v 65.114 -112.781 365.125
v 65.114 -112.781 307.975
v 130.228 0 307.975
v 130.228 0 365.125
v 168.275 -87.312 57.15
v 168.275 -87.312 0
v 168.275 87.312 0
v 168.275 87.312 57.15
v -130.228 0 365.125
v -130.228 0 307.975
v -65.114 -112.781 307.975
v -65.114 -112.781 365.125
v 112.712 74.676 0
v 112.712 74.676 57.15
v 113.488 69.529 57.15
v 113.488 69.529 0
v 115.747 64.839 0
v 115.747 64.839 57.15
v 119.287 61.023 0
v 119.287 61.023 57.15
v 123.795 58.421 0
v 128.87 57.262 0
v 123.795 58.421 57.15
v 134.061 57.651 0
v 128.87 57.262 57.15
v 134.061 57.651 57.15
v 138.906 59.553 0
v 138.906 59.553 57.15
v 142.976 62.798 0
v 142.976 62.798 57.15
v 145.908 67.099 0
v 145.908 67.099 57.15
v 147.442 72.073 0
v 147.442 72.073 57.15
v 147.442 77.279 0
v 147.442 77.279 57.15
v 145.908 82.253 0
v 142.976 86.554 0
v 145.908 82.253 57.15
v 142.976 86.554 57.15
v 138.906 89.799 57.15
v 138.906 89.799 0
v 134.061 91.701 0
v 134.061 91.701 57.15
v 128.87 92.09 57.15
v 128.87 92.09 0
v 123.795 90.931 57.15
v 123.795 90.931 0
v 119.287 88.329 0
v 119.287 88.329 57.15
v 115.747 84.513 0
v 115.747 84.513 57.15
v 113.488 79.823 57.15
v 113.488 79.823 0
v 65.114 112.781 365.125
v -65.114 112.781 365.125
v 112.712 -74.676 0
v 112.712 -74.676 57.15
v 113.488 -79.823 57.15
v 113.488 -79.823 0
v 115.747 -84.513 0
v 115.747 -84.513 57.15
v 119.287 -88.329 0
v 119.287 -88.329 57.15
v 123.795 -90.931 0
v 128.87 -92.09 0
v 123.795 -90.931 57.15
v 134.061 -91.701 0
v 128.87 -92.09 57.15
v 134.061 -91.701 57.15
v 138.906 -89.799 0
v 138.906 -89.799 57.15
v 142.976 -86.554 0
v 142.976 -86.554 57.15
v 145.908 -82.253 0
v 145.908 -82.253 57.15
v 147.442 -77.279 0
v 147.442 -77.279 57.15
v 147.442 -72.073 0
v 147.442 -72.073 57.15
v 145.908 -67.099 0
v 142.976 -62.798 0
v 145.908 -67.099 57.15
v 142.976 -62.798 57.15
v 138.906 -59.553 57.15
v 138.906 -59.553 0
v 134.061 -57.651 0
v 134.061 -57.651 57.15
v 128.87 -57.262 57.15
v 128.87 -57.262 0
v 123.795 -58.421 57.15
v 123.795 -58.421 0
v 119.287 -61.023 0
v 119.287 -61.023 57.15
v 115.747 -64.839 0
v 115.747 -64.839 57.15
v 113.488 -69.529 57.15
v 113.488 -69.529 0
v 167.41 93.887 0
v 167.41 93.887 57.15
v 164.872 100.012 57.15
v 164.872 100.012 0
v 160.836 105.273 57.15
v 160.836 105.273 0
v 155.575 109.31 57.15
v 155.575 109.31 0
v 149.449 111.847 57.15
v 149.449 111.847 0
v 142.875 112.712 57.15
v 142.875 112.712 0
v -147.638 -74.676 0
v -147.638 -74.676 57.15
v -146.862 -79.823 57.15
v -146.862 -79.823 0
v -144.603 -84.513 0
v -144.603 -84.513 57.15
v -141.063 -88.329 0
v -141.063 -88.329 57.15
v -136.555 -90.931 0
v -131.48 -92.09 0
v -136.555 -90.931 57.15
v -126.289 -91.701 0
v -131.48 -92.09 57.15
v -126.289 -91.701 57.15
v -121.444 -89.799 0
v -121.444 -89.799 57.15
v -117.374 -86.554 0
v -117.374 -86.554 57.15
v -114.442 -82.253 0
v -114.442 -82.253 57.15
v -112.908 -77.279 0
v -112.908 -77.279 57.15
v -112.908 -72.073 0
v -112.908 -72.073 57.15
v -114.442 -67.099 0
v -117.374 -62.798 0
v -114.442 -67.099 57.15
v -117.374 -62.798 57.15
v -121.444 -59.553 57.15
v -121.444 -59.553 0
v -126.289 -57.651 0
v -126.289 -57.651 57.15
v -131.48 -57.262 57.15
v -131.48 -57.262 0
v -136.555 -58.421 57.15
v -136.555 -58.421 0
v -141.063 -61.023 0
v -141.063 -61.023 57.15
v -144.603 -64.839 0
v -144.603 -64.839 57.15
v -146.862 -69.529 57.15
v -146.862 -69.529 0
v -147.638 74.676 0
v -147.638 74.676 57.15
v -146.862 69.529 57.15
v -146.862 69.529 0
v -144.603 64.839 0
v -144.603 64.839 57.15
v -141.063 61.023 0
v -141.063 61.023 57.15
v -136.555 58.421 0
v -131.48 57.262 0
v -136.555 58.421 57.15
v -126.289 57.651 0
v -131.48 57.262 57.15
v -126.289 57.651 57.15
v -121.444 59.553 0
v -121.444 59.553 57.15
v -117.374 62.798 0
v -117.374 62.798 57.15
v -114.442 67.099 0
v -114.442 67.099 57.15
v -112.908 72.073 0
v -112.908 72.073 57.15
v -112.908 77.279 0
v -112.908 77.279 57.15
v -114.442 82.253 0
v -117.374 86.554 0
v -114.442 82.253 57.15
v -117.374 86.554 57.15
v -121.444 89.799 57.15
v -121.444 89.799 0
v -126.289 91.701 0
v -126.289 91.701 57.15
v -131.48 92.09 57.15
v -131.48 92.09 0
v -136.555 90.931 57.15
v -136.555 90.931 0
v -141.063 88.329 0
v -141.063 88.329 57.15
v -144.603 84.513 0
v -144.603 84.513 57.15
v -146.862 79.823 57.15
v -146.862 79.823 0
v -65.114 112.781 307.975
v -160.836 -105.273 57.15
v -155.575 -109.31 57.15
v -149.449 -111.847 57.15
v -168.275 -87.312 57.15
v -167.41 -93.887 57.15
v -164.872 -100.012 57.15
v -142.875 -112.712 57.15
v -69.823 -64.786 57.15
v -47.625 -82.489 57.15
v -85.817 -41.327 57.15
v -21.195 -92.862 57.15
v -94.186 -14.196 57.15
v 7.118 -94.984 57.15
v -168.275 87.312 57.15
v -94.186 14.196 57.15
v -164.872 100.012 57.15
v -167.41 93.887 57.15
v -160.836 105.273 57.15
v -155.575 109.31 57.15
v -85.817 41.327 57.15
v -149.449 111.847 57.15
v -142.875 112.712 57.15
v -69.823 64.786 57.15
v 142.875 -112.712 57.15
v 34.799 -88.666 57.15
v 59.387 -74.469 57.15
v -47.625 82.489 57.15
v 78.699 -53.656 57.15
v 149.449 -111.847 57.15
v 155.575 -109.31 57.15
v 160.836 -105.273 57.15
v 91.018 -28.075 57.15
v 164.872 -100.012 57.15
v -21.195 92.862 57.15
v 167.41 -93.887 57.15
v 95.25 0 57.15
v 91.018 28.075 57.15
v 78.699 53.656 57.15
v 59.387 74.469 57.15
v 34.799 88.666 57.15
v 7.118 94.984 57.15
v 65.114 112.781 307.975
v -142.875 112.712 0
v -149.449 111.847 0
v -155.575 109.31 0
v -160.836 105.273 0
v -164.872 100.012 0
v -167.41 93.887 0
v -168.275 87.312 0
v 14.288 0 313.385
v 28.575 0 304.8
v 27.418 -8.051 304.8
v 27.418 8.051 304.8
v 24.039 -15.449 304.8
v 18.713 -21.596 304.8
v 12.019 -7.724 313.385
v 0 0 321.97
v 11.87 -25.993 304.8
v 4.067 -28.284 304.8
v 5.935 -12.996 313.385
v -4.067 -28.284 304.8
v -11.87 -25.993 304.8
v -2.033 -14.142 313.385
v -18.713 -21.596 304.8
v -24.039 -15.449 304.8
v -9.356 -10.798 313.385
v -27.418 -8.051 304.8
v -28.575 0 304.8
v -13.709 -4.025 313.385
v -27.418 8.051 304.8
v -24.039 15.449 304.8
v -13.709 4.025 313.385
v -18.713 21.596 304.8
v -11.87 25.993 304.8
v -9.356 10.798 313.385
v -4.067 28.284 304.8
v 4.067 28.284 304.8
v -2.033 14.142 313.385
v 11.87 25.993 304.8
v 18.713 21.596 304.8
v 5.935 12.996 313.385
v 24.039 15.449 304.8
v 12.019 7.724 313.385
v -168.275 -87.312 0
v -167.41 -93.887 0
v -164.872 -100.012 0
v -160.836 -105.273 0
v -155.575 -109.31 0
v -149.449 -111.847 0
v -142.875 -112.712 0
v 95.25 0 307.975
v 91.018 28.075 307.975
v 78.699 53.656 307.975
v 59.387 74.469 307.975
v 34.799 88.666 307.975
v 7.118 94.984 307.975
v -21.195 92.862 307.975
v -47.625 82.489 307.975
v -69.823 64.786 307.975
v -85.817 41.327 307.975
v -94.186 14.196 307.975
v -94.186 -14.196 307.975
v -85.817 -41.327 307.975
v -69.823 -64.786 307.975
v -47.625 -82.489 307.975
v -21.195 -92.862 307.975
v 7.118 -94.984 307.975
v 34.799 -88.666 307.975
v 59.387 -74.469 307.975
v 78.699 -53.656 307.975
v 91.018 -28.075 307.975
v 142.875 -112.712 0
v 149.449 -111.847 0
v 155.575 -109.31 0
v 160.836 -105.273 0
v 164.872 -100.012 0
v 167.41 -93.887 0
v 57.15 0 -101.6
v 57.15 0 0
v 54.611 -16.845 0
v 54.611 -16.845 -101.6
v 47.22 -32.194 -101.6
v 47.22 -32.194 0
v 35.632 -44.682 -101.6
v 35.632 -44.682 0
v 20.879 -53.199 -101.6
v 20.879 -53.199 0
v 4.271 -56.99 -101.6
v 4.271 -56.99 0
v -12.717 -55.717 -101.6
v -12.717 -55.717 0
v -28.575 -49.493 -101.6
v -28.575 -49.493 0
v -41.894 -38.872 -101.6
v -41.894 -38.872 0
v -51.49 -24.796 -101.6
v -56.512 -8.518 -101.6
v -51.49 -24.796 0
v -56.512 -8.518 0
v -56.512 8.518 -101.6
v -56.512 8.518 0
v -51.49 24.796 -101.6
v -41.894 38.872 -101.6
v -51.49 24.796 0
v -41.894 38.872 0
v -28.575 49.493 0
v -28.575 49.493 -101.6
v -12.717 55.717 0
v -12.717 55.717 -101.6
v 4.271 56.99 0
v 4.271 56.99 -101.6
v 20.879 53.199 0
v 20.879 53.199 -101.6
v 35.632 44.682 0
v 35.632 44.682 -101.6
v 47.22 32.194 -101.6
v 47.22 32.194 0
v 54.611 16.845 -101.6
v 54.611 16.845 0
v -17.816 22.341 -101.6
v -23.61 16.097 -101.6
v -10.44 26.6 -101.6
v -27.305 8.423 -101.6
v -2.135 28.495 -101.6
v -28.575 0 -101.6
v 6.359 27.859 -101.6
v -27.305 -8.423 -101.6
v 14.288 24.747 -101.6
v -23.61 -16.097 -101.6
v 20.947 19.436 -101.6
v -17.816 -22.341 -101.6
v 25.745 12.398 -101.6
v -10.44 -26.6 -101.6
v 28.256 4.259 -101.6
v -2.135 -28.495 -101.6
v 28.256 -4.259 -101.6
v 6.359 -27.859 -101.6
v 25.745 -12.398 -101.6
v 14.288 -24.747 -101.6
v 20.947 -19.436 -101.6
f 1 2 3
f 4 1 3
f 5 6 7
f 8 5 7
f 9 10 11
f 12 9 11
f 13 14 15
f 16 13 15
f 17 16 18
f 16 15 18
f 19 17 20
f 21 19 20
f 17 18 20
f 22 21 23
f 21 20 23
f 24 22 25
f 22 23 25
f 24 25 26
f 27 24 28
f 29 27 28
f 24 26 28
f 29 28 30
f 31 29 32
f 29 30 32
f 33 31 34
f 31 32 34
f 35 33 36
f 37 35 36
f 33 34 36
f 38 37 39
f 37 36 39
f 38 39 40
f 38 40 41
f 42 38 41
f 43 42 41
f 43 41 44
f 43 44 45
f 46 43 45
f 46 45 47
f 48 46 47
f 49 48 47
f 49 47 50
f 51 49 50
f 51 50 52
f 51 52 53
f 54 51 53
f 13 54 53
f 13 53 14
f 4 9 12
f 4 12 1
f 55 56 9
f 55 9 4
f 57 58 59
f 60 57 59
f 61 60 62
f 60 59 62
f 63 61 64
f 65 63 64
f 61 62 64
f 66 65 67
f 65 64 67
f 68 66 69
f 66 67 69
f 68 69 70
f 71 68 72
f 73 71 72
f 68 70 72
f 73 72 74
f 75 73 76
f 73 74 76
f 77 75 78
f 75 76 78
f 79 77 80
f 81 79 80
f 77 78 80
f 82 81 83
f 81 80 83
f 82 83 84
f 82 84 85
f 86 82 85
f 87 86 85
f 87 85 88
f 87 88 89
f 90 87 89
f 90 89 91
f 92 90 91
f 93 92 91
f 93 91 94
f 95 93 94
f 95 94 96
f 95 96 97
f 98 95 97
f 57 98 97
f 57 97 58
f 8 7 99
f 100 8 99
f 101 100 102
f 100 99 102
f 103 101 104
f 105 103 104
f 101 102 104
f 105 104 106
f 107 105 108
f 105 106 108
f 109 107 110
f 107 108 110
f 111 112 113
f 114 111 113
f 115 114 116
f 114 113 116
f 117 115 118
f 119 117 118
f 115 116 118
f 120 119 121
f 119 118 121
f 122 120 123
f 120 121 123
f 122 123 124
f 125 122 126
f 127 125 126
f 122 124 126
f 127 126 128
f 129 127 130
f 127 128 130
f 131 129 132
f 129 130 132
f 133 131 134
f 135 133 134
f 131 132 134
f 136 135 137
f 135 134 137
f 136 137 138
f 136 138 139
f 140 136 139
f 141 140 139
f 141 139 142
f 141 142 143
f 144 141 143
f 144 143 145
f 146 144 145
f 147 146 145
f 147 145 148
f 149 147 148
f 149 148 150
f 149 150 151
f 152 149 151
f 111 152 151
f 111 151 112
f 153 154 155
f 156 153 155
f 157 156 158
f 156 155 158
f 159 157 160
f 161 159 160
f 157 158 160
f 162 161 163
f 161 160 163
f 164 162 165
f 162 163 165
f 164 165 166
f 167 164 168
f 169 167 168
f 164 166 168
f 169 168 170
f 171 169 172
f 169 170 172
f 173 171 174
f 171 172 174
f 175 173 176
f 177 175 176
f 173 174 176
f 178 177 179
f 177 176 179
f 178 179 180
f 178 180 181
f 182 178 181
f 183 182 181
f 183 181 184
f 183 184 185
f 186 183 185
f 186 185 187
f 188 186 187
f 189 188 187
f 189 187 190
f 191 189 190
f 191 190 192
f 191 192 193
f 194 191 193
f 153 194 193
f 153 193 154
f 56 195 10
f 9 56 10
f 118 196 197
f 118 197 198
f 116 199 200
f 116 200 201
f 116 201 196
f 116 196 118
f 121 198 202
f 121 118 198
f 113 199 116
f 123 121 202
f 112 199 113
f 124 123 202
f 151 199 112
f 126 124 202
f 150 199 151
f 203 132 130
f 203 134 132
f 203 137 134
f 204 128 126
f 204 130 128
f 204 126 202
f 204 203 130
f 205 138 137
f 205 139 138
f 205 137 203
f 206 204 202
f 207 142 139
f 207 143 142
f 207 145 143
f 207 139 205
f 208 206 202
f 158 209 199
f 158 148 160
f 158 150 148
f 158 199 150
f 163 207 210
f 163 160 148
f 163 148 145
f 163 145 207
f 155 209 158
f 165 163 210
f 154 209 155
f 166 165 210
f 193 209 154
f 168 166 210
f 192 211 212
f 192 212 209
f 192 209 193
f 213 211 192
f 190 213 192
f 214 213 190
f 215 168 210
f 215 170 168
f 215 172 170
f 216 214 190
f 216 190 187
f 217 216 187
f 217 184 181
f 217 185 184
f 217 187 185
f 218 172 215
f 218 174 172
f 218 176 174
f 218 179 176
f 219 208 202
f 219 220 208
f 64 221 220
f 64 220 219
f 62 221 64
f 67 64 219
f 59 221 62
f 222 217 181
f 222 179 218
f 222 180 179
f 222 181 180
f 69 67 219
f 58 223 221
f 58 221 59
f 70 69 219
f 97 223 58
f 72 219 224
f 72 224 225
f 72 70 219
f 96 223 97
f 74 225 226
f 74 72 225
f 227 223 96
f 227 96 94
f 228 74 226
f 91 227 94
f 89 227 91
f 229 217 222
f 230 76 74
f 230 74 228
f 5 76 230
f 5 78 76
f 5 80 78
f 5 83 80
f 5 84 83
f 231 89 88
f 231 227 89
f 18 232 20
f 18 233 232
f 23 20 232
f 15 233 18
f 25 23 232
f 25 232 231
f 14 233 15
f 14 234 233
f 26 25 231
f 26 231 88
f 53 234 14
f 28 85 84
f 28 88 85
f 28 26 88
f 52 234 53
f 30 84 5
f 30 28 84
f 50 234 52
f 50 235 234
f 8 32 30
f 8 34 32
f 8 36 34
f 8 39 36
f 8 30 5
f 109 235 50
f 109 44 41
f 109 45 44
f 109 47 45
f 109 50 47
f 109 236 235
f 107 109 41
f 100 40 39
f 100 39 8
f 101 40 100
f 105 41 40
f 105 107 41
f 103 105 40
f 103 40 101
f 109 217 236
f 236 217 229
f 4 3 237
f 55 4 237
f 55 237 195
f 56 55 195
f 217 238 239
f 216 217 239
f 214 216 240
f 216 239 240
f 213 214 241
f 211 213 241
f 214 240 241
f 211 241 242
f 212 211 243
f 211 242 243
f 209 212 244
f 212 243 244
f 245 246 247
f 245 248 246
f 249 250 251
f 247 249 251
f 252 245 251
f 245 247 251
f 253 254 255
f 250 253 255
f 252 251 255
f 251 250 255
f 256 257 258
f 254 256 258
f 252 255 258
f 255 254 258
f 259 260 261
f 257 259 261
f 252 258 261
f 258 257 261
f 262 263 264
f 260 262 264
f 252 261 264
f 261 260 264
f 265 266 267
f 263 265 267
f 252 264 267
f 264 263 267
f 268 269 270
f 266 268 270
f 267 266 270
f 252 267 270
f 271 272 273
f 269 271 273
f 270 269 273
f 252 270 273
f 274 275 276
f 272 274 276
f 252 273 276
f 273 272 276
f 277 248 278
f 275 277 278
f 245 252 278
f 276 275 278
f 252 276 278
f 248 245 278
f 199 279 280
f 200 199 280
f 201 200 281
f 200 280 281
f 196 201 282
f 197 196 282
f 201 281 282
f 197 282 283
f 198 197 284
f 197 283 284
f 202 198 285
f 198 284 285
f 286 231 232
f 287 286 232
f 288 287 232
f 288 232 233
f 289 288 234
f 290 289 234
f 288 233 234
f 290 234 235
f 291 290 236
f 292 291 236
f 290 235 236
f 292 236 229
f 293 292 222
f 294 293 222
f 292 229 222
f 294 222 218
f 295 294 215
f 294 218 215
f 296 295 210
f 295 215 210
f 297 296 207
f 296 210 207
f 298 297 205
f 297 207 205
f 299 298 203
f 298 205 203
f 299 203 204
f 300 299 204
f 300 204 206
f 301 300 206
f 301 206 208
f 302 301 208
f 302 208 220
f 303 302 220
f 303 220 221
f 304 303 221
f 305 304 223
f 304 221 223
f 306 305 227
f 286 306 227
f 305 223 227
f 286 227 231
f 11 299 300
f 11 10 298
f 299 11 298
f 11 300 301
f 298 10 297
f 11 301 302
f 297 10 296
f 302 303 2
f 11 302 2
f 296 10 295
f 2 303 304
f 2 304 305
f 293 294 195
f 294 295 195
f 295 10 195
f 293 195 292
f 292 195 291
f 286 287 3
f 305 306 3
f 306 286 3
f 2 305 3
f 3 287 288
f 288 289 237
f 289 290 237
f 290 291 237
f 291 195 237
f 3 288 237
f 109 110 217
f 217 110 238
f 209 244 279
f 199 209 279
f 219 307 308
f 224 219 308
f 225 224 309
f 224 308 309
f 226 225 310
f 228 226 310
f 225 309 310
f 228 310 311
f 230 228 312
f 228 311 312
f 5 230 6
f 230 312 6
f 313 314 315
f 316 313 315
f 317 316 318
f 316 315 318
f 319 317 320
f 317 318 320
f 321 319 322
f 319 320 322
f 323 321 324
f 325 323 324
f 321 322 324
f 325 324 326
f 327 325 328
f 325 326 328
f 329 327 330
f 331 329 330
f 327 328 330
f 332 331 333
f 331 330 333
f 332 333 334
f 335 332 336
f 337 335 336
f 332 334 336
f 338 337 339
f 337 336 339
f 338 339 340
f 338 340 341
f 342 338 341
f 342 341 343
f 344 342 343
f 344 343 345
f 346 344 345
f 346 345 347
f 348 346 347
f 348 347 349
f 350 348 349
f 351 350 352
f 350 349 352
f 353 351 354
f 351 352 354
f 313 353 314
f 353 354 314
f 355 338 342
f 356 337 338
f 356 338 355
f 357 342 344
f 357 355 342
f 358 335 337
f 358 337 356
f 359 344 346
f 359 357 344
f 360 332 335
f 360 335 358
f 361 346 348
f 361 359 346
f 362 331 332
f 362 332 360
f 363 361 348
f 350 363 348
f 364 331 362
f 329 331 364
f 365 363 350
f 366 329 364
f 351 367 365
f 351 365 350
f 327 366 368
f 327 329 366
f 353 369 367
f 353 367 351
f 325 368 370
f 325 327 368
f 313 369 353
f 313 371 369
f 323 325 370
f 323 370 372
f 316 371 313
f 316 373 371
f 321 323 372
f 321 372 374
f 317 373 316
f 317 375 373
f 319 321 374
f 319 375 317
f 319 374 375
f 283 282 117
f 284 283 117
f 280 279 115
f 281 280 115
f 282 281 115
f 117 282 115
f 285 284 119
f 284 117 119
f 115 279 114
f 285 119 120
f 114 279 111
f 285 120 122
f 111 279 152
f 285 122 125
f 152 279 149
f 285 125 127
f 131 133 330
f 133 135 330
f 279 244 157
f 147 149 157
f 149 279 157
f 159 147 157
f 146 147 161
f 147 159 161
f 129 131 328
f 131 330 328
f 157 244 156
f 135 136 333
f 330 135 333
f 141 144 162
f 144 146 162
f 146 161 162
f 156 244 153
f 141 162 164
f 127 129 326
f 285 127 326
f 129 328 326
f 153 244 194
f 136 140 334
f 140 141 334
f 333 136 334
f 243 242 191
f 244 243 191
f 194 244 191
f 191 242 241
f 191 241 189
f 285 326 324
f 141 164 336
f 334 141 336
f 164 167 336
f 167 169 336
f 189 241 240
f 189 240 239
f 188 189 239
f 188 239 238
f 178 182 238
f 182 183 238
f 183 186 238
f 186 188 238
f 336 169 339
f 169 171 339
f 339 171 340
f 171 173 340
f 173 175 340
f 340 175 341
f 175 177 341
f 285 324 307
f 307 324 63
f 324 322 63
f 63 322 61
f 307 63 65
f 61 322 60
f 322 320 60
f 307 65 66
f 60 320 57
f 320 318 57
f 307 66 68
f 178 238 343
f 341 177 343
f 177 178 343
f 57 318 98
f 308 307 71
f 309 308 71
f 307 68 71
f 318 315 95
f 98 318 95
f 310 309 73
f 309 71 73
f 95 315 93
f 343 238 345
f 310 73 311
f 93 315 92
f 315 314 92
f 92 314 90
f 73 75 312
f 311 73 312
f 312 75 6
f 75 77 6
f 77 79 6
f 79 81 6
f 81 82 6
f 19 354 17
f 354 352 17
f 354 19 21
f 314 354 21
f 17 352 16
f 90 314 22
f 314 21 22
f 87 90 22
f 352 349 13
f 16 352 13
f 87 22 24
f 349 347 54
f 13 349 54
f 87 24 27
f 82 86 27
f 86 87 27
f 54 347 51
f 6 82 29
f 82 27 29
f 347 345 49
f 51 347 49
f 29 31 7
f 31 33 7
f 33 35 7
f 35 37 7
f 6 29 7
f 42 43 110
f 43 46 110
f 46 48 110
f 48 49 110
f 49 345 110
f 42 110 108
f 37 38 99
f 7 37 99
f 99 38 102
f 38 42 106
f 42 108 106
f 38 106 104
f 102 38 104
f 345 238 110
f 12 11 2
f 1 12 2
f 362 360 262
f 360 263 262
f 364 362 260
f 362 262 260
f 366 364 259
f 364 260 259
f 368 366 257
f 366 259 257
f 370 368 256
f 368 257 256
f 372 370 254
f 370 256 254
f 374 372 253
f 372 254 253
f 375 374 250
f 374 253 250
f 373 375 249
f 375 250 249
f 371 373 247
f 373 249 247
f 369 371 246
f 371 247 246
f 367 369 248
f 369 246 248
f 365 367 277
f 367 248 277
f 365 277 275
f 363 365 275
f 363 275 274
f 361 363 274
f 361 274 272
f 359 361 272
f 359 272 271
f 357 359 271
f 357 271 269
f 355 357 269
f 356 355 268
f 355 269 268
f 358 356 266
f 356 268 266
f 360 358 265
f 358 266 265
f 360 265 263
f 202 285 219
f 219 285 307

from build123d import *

# Parameters (mm, degrees)
F1_DEPTH  = 57.15
F2_R      = 95.25
F3_DEPTH  = 250.825
F5_DEPTH  = 57.15
F7_D      = 34.925
F8_R      = 57.15
F9_DEPTH  = 101.6
F11_D     = 57.15
F11_DEPTH = 406.4
F11_TIP   = 17.1695921887


with BuildPart() as f1:
    # F0 (on Top) → F1 (new body)
    with BuildSketch(Plane.XY):
        with BuildLine():
            Line((142.875, 112.7125), (-142.875, 112.7125))
            ThreePointArc((-142.875, 112.7125), (-160.8355122421, 105.2730122421), (-168.275, 87.3125))
            Line((-168.275, 87.3125), (-168.275, -87.3125))
            ThreePointArc((-168.275, -87.3125), (-160.8355122421, -105.2730122421), (-142.875, -112.7125))
            Line((-142.875, -112.7125), (142.875, -112.7125))
            ThreePointArc((142.875, -112.7125), (160.8355122421, -105.2730122421), (168.275, -87.3125))
            Line((168.275, -87.3125), (168.275, 87.3125))
            ThreePointArc((168.275, 87.3125), (160.8355122421, 105.2730122421), (142.875, 112.7125))
        make_face()
    extrude(amount=F1_DEPTH)

    # F2 (on face) → F3 (join)
    with BuildSketch(Plane.XY.offset(57.15)):
        Circle(F2_R)
    extrude(amount=F3_DEPTH)

    # F4 (on face) → F5 (join)
    with BuildSketch(Plane.XY.offset(307.975)):
        Polygon((65.11400916, 112.7807721496), (-65.11400916, 112.7807721496), (-130.2280183199, 0), (-65.11400916, -112.7807721496), (65.11400916, -112.7807721496), (130.2280183199, 0), align=None)
    extrude(amount=F5_DEPTH)

    # F7 (through all)
    with Locations(Plane(origin=(0, 0, 0), x_dir=(1, 0, 0), z_dir=(0, 0, -1))):
        with Locations((-130.175, 74.676), (-130.175, -74.676), (130.175, -74.676), (130.175, 74.676)):
            Hole(F7_D / 2)

    # F8 (on face) → F9 (join)
    with BuildSketch(Plane(origin=(0, 0, 0), x_dir=(1, 0, 0), z_dir=(0, 0, -1))):
        Circle(F8_R)
    extrude(amount=F9_DEPTH)

    # F11
    with Locations(Plane(origin=(0, 0, -101.6), x_dir=(1, 0, 0), z_dir=(0, 0, -1))):
        with Locations((0, 0)):
            Hole(F11_D / 2, depth=F11_DEPTH)
            with Locations((0, 0, -(F11_DEPTH + F11_TIP / 2))):  # 118° drill point
                Cone(0, F11_D / 2, F11_TIP, mode=Mode.SUBTRACT)


solid = f1.part
